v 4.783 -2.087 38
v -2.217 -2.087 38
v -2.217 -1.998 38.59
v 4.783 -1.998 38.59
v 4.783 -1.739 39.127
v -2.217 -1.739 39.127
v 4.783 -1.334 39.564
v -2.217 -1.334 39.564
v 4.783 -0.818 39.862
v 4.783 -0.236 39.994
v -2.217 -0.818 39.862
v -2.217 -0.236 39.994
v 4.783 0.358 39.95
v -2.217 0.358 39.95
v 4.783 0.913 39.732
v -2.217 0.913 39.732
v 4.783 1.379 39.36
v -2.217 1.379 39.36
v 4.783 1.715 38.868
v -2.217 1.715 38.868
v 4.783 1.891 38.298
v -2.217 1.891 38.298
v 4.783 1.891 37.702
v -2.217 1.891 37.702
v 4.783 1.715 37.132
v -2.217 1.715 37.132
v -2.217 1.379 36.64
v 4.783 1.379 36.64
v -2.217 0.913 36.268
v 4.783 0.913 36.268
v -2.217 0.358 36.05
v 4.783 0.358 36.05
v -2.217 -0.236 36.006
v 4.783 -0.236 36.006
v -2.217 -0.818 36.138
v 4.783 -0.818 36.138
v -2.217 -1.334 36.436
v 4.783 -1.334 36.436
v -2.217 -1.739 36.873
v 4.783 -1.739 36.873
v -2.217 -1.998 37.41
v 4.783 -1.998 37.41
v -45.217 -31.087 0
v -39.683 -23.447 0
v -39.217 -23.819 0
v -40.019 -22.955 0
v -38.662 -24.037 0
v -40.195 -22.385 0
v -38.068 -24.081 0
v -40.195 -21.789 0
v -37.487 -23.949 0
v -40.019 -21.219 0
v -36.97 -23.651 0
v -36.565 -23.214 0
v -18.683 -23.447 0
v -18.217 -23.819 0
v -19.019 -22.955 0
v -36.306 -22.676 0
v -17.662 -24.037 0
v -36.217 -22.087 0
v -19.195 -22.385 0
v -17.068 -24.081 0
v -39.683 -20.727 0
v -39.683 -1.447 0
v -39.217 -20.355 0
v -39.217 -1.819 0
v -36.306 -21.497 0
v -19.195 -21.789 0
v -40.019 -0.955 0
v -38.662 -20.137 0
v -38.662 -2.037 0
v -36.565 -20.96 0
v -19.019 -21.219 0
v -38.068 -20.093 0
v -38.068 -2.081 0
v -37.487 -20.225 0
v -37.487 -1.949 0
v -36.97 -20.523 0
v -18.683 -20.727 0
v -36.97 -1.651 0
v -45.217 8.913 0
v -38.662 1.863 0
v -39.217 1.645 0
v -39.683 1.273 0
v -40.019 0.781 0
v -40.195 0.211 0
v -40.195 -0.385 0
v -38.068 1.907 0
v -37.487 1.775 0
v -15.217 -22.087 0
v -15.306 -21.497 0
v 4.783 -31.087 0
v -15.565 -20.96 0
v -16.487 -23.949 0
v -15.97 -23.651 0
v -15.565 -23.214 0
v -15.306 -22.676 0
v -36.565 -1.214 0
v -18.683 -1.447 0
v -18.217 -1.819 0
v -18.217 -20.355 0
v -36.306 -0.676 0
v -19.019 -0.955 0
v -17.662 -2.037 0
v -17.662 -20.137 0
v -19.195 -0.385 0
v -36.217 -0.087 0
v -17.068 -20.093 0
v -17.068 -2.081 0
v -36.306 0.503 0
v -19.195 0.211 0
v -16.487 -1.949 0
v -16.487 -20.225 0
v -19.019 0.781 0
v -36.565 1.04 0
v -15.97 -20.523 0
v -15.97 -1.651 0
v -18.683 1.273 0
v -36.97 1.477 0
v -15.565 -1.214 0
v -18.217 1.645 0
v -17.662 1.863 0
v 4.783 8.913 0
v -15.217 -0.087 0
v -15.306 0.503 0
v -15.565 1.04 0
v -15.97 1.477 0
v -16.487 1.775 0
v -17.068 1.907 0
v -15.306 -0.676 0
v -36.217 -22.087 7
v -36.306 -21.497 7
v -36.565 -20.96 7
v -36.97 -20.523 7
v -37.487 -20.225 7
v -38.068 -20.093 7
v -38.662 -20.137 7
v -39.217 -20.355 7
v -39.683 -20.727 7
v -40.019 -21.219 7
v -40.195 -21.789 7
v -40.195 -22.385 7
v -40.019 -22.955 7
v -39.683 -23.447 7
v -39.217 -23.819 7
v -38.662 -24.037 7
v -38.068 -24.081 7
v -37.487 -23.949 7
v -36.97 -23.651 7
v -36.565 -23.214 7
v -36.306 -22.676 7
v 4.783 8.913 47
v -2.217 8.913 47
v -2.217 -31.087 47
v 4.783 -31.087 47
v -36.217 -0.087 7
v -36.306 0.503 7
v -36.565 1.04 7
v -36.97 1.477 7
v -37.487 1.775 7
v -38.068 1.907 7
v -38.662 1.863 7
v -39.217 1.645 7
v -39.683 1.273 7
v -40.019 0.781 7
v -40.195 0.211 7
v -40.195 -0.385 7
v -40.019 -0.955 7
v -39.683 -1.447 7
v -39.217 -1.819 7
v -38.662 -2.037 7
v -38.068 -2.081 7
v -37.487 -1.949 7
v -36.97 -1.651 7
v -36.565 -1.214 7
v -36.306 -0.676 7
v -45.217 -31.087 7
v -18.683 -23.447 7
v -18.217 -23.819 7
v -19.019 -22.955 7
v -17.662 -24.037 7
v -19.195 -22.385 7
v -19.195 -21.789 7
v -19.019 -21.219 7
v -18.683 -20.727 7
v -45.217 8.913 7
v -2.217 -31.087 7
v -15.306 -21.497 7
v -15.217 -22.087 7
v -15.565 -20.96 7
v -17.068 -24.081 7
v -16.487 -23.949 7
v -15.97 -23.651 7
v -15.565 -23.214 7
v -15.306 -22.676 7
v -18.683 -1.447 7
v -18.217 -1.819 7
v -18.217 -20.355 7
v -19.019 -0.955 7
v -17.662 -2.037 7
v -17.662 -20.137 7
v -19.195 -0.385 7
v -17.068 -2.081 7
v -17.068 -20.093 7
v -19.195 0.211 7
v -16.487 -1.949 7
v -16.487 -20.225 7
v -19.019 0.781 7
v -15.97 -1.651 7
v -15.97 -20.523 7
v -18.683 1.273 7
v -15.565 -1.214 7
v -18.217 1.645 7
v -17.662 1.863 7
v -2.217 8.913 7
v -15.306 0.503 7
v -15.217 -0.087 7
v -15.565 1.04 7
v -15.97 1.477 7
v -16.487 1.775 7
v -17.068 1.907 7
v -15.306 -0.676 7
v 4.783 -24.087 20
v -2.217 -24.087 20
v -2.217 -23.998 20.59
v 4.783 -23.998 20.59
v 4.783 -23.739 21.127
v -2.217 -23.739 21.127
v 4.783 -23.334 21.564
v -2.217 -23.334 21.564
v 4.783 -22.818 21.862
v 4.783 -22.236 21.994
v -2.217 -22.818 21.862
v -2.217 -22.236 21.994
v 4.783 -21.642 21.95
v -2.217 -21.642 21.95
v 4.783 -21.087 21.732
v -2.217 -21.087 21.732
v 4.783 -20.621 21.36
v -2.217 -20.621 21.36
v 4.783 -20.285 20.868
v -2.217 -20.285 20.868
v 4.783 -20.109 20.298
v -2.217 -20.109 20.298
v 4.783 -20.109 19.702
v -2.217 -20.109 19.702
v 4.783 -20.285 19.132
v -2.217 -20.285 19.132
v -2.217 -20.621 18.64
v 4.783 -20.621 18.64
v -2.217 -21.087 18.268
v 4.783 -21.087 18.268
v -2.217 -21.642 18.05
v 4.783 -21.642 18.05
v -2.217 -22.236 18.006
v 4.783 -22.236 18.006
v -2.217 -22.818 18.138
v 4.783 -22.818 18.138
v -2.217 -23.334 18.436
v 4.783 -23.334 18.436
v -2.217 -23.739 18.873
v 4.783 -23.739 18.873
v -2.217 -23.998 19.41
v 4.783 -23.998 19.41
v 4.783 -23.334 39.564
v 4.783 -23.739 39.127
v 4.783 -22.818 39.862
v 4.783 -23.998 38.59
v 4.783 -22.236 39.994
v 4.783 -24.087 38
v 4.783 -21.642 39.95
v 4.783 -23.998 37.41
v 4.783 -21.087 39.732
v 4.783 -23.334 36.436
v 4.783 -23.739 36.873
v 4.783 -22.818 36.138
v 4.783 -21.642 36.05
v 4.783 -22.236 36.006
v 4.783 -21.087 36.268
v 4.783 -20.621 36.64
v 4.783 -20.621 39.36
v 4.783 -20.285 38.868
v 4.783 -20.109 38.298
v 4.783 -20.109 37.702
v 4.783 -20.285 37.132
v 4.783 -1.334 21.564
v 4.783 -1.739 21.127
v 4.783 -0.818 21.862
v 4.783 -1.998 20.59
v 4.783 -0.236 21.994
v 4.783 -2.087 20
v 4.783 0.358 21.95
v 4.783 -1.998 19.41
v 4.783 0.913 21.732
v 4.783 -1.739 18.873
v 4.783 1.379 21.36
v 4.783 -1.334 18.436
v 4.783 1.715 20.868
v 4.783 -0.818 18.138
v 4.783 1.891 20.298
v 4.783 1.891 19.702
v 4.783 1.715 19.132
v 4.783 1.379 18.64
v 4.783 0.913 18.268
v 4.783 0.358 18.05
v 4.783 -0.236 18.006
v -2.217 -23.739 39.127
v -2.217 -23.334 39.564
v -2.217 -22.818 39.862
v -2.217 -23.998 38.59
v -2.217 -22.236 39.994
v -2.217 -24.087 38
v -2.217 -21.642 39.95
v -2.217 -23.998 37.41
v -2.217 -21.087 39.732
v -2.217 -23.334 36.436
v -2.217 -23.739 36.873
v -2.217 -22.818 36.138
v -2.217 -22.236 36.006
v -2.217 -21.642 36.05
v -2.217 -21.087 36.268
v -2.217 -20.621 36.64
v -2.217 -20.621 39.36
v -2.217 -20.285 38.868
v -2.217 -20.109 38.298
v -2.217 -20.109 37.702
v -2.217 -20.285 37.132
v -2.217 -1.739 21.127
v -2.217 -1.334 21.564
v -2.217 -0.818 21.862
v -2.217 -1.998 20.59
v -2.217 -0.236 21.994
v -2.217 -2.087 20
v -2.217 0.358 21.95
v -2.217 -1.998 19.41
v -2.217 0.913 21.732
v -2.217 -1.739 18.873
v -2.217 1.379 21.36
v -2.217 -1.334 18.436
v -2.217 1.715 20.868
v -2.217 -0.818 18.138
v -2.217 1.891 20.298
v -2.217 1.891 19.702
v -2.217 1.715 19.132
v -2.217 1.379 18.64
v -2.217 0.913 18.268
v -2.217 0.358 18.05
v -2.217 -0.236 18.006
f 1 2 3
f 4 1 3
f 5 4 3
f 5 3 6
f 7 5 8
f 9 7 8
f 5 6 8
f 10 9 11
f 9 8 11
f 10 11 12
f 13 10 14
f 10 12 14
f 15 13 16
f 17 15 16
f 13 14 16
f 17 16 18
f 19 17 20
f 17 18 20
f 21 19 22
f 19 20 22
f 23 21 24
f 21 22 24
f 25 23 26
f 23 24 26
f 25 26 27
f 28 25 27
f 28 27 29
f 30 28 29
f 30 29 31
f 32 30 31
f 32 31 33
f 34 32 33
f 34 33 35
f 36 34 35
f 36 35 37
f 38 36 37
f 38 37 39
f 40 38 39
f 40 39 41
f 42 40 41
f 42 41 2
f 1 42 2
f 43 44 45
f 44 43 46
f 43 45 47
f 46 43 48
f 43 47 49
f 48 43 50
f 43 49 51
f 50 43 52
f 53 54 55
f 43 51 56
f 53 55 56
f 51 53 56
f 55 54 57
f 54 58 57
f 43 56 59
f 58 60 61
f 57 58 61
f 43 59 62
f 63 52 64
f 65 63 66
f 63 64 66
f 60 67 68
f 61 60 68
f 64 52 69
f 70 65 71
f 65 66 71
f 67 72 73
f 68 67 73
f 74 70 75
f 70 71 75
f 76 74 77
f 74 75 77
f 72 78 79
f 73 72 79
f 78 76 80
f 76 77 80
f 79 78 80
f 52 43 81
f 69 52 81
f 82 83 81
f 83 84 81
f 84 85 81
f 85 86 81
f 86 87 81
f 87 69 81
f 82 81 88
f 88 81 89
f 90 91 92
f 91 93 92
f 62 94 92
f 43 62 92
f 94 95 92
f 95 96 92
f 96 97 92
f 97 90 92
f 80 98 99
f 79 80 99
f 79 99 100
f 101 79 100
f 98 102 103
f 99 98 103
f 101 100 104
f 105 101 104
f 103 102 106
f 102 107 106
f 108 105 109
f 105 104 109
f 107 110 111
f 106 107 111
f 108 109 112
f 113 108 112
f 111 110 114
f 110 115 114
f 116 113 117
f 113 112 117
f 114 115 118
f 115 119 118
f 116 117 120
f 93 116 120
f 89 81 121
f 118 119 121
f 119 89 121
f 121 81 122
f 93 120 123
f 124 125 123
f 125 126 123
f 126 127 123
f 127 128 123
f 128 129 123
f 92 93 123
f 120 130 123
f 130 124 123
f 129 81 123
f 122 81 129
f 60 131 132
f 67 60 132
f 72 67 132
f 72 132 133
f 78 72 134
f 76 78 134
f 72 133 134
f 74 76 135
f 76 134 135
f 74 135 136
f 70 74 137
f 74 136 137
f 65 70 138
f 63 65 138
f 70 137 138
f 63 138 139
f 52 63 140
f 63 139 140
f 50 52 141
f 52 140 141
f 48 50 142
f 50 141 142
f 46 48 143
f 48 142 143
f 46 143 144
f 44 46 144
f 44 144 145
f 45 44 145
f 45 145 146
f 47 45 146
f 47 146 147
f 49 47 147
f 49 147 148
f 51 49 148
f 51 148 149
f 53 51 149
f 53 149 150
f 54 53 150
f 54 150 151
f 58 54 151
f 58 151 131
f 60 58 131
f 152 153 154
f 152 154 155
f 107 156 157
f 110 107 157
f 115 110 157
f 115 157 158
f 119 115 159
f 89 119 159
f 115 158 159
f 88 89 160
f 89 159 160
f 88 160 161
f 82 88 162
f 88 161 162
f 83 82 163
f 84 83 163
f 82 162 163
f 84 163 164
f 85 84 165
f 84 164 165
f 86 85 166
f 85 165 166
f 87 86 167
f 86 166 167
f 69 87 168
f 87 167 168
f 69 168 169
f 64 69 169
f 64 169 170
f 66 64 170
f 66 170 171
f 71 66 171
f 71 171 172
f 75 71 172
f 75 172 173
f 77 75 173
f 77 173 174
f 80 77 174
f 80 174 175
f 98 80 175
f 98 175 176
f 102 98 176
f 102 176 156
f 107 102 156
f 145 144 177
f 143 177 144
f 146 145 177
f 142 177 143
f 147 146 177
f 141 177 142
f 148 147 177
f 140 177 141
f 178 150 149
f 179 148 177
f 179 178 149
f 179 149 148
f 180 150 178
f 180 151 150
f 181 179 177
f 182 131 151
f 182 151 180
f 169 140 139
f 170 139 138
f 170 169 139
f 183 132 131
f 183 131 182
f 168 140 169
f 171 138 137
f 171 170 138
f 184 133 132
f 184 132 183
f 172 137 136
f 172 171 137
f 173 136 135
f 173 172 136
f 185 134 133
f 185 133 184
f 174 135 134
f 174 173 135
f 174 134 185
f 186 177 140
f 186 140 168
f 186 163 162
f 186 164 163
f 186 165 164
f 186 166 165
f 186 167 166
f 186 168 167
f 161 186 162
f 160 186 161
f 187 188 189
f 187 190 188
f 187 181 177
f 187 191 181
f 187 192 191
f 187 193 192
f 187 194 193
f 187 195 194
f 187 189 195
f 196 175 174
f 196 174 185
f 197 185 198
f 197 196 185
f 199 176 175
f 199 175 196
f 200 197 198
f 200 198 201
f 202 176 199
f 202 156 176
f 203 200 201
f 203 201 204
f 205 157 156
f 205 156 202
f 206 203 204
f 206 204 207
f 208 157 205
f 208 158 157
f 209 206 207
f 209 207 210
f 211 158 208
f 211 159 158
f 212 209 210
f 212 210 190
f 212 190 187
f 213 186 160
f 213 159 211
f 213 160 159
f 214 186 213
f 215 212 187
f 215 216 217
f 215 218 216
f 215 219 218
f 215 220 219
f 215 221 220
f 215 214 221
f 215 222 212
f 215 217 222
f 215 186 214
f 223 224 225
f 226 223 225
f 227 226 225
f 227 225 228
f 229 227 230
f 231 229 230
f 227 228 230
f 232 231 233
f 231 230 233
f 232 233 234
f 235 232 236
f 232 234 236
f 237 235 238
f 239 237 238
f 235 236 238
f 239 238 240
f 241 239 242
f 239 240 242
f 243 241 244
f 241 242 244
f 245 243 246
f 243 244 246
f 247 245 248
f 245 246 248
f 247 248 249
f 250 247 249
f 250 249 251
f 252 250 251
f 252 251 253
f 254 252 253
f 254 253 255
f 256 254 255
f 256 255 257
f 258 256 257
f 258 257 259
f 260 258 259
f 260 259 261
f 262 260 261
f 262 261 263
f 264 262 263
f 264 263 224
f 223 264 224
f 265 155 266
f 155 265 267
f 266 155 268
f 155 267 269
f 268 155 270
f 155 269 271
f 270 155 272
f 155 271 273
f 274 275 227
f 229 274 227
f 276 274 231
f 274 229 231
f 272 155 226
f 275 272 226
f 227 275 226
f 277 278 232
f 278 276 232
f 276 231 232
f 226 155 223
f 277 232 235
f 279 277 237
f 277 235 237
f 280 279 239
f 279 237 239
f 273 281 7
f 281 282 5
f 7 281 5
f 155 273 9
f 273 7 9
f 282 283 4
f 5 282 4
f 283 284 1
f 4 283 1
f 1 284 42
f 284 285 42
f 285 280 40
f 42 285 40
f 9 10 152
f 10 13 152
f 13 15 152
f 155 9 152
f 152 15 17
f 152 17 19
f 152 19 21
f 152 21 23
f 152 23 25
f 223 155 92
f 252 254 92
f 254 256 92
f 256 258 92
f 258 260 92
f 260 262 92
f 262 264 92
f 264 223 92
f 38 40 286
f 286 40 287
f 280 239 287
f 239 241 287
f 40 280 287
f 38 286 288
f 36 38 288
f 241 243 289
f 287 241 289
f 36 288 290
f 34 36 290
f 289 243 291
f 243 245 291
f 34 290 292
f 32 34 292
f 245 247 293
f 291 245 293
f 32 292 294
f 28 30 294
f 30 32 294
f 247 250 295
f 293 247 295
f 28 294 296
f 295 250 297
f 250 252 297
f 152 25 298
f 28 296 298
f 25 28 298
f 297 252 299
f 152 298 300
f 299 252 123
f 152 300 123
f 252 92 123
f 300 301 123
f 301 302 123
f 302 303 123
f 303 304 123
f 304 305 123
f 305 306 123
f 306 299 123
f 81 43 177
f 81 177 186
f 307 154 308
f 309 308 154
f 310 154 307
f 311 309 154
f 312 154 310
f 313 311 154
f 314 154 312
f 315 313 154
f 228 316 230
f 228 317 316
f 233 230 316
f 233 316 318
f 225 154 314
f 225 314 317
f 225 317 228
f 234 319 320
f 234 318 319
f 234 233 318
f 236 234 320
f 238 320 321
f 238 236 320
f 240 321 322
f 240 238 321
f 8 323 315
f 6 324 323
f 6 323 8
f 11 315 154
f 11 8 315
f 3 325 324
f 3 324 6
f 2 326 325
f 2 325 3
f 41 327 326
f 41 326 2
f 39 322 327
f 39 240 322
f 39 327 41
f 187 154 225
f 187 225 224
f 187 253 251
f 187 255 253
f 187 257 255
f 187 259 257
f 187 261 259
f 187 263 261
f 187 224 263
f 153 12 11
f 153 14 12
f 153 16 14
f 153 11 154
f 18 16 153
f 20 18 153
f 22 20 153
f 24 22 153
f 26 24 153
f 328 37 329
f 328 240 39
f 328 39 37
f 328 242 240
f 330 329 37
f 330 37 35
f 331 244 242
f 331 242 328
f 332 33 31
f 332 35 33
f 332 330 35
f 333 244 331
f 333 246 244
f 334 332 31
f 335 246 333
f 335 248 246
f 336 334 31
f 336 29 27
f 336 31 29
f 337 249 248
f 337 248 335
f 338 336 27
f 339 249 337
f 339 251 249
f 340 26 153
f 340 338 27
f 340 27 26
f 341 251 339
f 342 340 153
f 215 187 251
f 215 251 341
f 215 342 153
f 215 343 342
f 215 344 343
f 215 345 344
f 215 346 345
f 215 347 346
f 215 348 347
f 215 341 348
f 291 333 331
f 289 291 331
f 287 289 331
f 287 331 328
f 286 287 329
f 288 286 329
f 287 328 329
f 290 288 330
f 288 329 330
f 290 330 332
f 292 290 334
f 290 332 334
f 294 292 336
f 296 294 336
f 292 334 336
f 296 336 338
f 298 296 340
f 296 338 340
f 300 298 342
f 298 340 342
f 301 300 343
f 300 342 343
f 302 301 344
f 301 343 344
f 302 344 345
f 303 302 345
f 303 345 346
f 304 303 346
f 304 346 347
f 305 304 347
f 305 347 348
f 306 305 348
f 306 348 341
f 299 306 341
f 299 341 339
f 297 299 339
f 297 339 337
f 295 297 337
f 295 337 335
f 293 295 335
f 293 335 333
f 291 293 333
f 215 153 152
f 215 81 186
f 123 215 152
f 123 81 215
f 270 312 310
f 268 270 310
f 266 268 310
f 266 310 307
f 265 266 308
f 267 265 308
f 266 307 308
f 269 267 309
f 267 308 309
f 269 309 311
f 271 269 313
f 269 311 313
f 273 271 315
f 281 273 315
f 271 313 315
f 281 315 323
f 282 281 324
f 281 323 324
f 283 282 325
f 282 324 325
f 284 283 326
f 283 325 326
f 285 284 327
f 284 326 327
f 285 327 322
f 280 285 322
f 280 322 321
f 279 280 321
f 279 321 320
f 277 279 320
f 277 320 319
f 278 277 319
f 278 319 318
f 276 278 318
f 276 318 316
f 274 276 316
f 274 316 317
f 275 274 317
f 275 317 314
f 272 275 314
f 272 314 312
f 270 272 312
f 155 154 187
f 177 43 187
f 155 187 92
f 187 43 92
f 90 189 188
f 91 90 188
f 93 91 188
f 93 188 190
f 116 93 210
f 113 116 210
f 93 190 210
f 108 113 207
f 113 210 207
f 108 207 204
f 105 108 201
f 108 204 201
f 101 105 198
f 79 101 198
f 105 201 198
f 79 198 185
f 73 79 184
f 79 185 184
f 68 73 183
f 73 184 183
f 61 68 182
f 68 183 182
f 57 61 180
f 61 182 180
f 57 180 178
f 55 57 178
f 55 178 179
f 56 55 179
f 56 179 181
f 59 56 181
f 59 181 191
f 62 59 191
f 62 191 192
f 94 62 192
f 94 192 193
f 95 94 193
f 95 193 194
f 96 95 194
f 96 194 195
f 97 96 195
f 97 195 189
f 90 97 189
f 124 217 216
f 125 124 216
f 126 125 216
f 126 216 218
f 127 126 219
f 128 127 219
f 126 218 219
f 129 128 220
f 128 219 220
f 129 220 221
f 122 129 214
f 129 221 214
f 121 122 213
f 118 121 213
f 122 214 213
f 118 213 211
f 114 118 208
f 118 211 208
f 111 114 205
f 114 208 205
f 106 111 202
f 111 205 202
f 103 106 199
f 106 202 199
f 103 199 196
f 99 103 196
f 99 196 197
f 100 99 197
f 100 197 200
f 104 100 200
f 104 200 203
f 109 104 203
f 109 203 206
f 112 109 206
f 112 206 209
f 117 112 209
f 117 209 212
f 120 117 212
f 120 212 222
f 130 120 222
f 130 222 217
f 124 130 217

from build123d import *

# Parameters (mm, degrees)
SKETCH1_W           = 50
SKETCH1_H           = 40
BOSS_EXTRUDE1_DEPTH = 7
SKETCH2_W           = 7
SKETCH2_H           = 40
BOSS_EXTRUDE2_DEPTH = 40
SKETCH3_R           = 2
CUT_EXTRUDE1_DEPTH  = 40
SKETCH4_R           = 2
CUT_EXTRUDE2_DEPTH  = 40


with BuildPart() as part:
    # Sketch1 → Boss-Extrude1 (new body)
    with BuildSketch(Plane.XY):
        with Locations((-20.217391304, -11.086956522)):
            Rectangle(SKETCH1_W, SKETCH1_H)
    extrude(amount=BOSS_EXTRUDE1_DEPTH)

    # Sketch2 → Boss-Extrude2 (add)
    with BuildSketch(Plane.XY.offset(7)):
        with Locations((1.282608696, -11.086956522)):
            Rectangle(SKETCH2_W, SKETCH2_H)
    extrude(amount=BOSS_EXTRUDE2_DEPTH)

    # Sketch3 → Cut-Extrude1 (cut)
    with BuildSketch(Plane.XY.offset(7)):
        with Locations((-38.217391304, -0.086956522)):
            Circle(SKETCH3_R)
        with Locations((-38.217391304, -22.086956522)):
            Circle(SKETCH3_R)
        with Locations((-17.217391304, -0.086956522)):
            Circle(SKETCH3_R)
        with Locations((-17.217391304, -22.086956522)):
            Circle(SKETCH3_R)
    extrude(amount=-CUT_EXTRUDE1_DEPTH, mode=Mode.SUBTRACT)

    # Sketch4 → Cut-Extrude2 (cut)
    with BuildSketch(Plane.ZY.offset(2.217391304)):
        with Locations(Location((38, -0.086956522, 0), (0, 0, 270))):
            Circle(SKETCH4_R)
        with Locations(Location((38, -22.086956522, 0), (0, 0, 270))):
            Circle(SKETCH4_R)
        with Locations(Location((20, -0.086956522, 0), (0, 0, 270))):
            Circle(SKETCH4_R)
        with Locations(Location((20, -22.086956522, 0), (0, 0, 270))):
            Circle(SKETCH4_R)
    extrude(amount=-CUT_EXTRUDE2_DEPTH, mode=Mode.SUBTRACT)


solid = part.part
